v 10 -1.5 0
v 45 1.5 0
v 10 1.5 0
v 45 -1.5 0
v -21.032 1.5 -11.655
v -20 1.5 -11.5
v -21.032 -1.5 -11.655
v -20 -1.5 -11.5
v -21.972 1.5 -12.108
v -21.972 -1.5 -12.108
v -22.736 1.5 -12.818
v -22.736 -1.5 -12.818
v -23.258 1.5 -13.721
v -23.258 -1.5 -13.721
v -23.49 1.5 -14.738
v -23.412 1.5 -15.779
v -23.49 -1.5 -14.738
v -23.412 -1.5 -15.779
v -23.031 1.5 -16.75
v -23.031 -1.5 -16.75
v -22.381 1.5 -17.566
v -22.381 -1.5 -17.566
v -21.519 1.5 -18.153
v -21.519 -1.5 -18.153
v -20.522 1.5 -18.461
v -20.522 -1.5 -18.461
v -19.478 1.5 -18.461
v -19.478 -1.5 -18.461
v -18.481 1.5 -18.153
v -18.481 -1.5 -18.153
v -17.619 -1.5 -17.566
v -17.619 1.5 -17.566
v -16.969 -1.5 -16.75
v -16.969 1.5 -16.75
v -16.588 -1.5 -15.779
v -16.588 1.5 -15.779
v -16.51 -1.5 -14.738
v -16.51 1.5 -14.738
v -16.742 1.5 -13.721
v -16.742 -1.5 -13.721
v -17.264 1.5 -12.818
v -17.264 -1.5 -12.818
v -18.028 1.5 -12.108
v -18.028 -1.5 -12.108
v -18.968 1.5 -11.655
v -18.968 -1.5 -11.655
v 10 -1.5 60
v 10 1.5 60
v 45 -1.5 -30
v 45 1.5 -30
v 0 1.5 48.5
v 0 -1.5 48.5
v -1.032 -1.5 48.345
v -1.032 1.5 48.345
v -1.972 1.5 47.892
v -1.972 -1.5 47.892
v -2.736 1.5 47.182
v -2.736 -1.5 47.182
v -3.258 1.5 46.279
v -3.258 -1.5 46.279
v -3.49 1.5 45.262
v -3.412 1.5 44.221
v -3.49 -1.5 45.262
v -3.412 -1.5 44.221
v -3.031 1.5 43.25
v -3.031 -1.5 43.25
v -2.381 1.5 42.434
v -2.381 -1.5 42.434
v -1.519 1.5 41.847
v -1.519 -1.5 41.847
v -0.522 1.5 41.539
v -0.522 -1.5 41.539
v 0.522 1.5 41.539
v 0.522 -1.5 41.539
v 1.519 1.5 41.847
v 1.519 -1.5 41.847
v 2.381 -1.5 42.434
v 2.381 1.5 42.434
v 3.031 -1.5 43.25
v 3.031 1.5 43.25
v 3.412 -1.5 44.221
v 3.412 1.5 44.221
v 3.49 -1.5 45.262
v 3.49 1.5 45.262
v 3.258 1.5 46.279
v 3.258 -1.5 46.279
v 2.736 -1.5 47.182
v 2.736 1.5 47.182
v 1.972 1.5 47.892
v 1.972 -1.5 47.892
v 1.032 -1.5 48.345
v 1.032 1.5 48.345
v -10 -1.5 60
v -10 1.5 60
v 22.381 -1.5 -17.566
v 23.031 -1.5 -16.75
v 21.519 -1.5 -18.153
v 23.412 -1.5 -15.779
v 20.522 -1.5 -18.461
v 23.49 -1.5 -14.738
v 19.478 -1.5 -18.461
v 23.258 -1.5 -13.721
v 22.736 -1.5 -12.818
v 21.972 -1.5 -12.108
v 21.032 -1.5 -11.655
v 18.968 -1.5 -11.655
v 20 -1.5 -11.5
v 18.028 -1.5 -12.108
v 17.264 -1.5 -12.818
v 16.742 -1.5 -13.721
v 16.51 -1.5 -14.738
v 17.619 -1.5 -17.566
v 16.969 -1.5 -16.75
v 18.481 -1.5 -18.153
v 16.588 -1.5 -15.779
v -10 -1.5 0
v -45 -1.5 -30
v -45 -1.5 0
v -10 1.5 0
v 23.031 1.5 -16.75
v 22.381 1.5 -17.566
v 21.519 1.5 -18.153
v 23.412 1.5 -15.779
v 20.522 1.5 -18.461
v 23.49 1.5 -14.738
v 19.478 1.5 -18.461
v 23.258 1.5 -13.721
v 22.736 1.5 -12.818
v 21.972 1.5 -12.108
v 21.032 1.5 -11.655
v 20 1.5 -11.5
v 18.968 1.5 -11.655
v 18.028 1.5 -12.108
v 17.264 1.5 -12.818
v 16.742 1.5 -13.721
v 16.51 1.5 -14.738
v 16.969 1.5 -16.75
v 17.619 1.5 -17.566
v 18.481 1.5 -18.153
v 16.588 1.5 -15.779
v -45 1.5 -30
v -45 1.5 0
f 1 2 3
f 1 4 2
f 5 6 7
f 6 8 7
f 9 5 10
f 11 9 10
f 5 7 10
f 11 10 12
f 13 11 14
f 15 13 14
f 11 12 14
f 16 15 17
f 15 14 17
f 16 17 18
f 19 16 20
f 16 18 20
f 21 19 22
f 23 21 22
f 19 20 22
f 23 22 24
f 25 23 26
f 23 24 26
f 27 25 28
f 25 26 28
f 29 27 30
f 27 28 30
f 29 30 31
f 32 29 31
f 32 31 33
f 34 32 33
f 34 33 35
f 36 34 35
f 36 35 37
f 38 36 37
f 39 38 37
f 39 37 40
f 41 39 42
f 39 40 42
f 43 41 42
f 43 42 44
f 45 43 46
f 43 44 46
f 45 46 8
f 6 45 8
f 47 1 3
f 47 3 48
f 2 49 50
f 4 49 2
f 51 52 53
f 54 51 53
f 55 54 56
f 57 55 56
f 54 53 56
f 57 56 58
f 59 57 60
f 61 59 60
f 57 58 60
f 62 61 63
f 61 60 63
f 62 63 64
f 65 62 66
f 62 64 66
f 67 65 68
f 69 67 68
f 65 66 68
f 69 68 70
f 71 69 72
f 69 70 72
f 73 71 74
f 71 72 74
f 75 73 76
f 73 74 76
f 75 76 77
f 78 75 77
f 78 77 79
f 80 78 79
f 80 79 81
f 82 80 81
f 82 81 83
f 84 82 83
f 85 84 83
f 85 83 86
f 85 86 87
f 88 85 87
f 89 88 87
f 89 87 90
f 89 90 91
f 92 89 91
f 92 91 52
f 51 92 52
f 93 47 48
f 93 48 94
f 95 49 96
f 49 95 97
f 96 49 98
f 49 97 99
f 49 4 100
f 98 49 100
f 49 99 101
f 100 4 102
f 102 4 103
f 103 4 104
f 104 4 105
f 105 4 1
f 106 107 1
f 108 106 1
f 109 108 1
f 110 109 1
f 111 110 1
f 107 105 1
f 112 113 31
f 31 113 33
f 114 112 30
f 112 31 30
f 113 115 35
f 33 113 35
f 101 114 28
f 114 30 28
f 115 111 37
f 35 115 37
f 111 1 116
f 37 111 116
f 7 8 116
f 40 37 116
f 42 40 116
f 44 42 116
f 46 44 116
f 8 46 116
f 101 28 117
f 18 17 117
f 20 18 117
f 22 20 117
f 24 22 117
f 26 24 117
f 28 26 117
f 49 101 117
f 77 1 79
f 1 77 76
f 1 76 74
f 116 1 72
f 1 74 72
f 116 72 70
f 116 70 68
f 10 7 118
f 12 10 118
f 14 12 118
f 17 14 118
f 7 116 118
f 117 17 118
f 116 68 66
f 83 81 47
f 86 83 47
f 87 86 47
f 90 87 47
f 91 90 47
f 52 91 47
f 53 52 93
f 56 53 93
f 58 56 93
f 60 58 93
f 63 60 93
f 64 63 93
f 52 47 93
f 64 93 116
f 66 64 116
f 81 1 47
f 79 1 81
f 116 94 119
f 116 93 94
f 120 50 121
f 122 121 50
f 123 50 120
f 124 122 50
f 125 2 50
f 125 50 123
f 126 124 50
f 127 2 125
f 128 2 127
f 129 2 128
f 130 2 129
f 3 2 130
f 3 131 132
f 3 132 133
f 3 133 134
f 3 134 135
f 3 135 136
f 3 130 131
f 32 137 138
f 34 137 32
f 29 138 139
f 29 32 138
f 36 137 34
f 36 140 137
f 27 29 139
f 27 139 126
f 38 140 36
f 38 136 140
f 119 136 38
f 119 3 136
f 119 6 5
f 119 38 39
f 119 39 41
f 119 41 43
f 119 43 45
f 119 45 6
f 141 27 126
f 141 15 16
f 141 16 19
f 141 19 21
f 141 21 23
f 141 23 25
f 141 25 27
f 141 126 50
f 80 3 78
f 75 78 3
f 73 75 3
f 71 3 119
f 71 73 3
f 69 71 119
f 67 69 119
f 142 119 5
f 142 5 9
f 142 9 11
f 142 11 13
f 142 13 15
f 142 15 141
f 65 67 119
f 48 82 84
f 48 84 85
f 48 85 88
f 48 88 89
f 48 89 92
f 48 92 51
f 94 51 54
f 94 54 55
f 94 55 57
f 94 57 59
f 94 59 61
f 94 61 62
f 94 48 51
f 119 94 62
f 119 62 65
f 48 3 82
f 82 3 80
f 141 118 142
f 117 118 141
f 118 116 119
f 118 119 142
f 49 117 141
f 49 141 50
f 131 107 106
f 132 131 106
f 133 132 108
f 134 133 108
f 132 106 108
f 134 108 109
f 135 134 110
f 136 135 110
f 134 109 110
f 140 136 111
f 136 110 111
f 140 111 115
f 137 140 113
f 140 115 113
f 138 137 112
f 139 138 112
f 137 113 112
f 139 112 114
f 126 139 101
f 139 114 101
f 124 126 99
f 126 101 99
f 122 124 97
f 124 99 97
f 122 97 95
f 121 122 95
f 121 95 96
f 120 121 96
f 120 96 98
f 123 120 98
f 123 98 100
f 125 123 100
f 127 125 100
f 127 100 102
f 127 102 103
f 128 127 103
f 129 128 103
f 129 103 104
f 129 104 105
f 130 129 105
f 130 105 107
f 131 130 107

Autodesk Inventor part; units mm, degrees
ref_plane "YZ Plane" through (0, 0, 0) normal (1, 0, 0) x (0, 1, 0)
ref_plane "XZ Plane" through (0, 0, 0) normal (0, 1, 0) x (-1, 0, 0)
ref_plane "XY Plane" through (0, 0, 0) normal (0, 0, 1) x (1, 0, 0)
sketch "Sketch1" plane through (0, 0, 0) normal (0, 1, 0) x (-1, 0, 0)
  line L0 (-10, 0) -> (-10, 60)
  line L1 (-10, 60) -> (10, 60)
  line L2 (10, 60) -> (10, 0)
  line L3 (10, 0) -> (45, 0)
  line L4 (45, 0) -> (45, -30)
  line L5 (45, -30) -> (-45, -30)
  line L6 (-45, -30) -> (-45, 0)
  line L7 (-45, 0) -> (-10, 0)
  point P0 (0, 0)
  point P1 (0, 60)
  dimension "d0" = 20
  dimension "d1" = 30
  dimension "d2" = 60
  dimension "d3" = 90
extrude "Plate1" add sketch "Sketch1" along normal mid plane 3
sketch "Sketch2" plane through (0, 1.5, 0) normal (0, 1, 0) x (1, 0, 0)
  line L0 (10, -60) -> (-10, -60) projected
  line L1 (45, 30) -> (45, 0) projected
  line L2 (-45, 0) -> (-45, 30) projected
  point P0 (0, 0)
  point P1 (0, -45)
  point P2 (20, 15)
  point P3 (-20, 15)
  point P4 (-45, 15)
  dimension "d5" = 15
  dimension "d6" = 25
  dimension "d7" = 25
hole "Hole1" at (0, 1.5, 45) at (20, 1.5, -15) at (-20, 1.5, -15) direction (0, -1, 0) diameter 7 depth 3
equation "\"d6\" = d7"
equation "\"d13\" = Thickness"
equation "\"d4\" = Thickness"
equation "\"BendRadius\" = Thickness"
equation "\"BendReliefWidth\" = Thickness"
equation "\"BendReliefDepth\" = 0.5 * Thickness"
equation "\"CornerReliefSize\" = 4 * Thickness"
equation "\"MinimumRemnant\" = 2 * Thickness"
equation "\"TransitionRadius\" = BendRadius"
equation "\"JacobiRadiusSize\" = BendRadius"
equation "\"GapSize\" = Thickness"
equation "\"Thickness\" = 3"
properties part number "HCMUTE-CDT23-OP_TAMLOT" material "Stainless Steel"
